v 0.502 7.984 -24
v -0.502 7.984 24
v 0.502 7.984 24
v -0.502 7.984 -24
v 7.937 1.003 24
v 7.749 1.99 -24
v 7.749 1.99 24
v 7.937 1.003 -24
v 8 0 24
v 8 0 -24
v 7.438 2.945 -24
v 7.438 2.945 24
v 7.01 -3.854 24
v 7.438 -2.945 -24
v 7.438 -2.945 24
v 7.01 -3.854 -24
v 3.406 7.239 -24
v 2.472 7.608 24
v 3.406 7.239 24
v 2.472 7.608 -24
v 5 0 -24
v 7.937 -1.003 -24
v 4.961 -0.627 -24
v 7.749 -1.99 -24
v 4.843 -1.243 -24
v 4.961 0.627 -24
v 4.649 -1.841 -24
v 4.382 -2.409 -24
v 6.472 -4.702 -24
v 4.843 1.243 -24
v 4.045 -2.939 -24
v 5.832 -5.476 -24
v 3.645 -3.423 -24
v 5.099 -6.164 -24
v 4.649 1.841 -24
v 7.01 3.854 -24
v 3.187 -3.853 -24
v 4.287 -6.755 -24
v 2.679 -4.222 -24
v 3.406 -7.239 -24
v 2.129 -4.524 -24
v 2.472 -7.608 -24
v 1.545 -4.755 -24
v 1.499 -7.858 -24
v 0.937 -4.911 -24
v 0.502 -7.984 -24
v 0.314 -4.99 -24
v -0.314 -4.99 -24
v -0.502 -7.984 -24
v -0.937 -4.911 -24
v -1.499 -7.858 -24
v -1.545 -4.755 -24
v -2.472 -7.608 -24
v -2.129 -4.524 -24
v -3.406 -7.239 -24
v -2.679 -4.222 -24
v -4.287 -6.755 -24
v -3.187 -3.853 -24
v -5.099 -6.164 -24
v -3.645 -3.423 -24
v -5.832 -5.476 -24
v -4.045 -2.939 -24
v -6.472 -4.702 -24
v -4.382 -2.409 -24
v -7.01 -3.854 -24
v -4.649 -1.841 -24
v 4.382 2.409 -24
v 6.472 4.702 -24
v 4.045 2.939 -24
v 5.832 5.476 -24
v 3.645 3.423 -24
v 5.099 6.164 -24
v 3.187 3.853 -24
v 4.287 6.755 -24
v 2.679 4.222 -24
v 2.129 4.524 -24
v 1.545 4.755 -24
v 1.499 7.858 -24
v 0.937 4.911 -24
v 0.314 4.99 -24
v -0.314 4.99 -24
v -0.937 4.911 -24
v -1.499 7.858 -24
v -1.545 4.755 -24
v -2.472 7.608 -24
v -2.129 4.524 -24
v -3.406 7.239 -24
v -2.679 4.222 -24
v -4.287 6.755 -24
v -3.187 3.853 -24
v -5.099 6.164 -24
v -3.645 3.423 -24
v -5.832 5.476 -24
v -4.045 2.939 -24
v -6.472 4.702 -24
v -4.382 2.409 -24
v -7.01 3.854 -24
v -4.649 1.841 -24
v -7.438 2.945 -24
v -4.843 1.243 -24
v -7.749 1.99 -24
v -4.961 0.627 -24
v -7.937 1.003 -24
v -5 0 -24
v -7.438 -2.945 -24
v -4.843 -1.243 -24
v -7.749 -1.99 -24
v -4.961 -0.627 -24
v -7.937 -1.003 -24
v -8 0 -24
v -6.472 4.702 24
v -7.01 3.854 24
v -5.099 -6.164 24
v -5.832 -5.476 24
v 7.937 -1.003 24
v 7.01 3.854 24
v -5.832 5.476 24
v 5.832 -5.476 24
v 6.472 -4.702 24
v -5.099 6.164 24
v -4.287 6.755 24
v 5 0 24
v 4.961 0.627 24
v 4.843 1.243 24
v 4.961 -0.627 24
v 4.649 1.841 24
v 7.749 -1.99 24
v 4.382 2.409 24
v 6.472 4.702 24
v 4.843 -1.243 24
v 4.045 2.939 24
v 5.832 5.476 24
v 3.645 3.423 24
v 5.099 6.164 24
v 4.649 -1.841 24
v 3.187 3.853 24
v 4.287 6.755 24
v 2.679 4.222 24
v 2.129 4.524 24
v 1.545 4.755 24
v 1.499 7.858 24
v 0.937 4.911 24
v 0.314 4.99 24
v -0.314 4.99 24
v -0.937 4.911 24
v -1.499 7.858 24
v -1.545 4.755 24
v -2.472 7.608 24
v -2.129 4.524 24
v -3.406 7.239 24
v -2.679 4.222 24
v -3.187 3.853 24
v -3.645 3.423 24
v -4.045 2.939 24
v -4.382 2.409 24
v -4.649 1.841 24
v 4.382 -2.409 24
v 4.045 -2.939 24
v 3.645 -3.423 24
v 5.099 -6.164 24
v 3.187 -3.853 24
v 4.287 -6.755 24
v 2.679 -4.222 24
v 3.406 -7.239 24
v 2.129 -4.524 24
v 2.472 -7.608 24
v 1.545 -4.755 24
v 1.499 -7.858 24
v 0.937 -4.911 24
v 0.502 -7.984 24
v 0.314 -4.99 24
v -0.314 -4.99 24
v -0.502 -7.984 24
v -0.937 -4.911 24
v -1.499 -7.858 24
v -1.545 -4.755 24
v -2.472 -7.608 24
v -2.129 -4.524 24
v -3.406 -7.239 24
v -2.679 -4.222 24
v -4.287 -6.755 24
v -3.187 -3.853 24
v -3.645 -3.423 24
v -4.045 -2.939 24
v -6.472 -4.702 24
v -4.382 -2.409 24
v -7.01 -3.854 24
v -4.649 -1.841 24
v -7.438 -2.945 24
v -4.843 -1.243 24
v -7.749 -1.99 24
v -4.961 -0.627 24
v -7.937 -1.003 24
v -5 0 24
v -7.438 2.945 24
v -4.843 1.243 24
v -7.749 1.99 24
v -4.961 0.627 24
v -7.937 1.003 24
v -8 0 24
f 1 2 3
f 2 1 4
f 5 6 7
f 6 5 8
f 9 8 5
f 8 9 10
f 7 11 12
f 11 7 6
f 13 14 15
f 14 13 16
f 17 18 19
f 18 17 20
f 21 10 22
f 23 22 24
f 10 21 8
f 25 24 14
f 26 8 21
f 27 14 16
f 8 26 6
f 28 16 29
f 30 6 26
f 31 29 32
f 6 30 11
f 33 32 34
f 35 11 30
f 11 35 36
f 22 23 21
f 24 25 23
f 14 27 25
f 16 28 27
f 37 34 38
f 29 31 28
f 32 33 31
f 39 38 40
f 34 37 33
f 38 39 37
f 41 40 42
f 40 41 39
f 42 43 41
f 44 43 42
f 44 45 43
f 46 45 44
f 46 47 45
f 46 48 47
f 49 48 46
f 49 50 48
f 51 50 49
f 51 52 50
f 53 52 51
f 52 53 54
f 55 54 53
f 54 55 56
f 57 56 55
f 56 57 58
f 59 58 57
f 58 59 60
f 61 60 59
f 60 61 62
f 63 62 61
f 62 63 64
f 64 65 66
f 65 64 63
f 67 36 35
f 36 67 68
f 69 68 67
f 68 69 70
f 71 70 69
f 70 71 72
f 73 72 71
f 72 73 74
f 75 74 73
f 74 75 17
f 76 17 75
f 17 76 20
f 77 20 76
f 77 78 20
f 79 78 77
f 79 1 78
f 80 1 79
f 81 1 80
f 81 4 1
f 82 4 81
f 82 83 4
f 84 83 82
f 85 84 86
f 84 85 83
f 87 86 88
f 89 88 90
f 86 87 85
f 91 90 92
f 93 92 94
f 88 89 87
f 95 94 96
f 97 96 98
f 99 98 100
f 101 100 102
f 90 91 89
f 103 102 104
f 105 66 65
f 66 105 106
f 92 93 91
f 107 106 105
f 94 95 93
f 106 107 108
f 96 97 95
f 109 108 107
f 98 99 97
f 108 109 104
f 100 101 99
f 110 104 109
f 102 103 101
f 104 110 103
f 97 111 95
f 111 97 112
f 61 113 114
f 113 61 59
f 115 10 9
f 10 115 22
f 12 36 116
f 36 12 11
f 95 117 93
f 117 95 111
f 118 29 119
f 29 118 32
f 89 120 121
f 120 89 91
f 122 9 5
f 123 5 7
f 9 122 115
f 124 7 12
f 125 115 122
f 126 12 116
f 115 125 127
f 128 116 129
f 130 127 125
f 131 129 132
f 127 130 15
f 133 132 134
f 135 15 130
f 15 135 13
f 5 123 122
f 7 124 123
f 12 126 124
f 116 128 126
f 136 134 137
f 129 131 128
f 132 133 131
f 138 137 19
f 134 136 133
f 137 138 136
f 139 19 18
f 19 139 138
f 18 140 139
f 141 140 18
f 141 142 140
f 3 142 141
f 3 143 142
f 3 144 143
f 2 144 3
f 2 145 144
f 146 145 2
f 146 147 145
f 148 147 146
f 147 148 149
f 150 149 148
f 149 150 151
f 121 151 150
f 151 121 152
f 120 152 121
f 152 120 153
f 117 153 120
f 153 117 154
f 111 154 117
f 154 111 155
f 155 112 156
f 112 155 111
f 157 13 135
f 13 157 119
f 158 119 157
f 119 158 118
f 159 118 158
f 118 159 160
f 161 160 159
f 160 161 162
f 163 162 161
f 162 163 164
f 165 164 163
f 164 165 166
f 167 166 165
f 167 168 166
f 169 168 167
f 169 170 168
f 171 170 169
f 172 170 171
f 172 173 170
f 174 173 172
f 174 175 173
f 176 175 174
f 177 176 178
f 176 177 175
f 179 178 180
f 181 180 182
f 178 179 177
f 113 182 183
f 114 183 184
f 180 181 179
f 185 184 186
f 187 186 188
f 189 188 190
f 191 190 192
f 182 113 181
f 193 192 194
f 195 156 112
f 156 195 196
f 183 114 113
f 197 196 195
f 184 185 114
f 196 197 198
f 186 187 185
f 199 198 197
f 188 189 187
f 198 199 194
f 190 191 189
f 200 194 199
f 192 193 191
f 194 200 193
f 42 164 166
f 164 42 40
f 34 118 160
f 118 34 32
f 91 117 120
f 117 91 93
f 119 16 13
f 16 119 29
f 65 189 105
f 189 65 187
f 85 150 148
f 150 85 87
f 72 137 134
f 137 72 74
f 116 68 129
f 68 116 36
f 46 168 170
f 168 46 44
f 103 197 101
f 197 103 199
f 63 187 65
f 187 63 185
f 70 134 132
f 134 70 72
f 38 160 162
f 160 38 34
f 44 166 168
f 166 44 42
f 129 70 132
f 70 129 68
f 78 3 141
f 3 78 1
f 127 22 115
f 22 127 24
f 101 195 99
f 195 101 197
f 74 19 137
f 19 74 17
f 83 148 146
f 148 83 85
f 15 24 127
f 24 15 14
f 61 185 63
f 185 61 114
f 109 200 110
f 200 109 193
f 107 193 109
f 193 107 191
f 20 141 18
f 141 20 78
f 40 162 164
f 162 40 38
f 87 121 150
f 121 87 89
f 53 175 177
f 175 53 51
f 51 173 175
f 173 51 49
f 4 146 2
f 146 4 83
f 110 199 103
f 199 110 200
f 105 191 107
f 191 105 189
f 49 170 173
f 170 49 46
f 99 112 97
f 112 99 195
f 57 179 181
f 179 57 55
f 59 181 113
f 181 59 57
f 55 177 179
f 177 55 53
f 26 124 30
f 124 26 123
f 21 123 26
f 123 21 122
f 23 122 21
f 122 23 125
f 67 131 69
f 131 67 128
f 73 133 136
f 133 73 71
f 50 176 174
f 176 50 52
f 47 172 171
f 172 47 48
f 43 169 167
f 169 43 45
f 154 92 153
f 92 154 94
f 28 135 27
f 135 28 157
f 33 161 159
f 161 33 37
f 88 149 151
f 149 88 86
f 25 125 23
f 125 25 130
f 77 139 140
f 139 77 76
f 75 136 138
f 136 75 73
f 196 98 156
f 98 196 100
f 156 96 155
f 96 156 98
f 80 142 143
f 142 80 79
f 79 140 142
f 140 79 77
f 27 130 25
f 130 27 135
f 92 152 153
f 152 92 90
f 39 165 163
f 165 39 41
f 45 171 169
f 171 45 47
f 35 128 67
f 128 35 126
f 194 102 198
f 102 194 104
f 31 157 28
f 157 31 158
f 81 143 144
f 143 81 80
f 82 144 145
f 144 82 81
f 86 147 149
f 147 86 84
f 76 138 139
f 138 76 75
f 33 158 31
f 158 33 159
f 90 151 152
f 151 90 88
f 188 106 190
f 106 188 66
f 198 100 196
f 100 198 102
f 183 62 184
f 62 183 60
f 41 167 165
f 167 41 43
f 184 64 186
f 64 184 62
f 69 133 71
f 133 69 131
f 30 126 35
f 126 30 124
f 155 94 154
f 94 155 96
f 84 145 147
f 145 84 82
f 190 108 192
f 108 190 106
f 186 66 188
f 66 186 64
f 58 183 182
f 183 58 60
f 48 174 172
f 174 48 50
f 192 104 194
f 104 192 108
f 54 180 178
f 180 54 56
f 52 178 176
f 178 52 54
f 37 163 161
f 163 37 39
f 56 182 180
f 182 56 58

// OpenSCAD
$fn = 50;


difference() {
	union() {
		translate(v = [0, 0, -24.0000000000]) {
			cylinder(h = 48, r = 8.0000000000);
		}
	}
	union() {
		translate(v = [0, 0, -100.0000000000]) {
			cylinder(h = 200, r = 5.0000000000);
		}
	}
}
